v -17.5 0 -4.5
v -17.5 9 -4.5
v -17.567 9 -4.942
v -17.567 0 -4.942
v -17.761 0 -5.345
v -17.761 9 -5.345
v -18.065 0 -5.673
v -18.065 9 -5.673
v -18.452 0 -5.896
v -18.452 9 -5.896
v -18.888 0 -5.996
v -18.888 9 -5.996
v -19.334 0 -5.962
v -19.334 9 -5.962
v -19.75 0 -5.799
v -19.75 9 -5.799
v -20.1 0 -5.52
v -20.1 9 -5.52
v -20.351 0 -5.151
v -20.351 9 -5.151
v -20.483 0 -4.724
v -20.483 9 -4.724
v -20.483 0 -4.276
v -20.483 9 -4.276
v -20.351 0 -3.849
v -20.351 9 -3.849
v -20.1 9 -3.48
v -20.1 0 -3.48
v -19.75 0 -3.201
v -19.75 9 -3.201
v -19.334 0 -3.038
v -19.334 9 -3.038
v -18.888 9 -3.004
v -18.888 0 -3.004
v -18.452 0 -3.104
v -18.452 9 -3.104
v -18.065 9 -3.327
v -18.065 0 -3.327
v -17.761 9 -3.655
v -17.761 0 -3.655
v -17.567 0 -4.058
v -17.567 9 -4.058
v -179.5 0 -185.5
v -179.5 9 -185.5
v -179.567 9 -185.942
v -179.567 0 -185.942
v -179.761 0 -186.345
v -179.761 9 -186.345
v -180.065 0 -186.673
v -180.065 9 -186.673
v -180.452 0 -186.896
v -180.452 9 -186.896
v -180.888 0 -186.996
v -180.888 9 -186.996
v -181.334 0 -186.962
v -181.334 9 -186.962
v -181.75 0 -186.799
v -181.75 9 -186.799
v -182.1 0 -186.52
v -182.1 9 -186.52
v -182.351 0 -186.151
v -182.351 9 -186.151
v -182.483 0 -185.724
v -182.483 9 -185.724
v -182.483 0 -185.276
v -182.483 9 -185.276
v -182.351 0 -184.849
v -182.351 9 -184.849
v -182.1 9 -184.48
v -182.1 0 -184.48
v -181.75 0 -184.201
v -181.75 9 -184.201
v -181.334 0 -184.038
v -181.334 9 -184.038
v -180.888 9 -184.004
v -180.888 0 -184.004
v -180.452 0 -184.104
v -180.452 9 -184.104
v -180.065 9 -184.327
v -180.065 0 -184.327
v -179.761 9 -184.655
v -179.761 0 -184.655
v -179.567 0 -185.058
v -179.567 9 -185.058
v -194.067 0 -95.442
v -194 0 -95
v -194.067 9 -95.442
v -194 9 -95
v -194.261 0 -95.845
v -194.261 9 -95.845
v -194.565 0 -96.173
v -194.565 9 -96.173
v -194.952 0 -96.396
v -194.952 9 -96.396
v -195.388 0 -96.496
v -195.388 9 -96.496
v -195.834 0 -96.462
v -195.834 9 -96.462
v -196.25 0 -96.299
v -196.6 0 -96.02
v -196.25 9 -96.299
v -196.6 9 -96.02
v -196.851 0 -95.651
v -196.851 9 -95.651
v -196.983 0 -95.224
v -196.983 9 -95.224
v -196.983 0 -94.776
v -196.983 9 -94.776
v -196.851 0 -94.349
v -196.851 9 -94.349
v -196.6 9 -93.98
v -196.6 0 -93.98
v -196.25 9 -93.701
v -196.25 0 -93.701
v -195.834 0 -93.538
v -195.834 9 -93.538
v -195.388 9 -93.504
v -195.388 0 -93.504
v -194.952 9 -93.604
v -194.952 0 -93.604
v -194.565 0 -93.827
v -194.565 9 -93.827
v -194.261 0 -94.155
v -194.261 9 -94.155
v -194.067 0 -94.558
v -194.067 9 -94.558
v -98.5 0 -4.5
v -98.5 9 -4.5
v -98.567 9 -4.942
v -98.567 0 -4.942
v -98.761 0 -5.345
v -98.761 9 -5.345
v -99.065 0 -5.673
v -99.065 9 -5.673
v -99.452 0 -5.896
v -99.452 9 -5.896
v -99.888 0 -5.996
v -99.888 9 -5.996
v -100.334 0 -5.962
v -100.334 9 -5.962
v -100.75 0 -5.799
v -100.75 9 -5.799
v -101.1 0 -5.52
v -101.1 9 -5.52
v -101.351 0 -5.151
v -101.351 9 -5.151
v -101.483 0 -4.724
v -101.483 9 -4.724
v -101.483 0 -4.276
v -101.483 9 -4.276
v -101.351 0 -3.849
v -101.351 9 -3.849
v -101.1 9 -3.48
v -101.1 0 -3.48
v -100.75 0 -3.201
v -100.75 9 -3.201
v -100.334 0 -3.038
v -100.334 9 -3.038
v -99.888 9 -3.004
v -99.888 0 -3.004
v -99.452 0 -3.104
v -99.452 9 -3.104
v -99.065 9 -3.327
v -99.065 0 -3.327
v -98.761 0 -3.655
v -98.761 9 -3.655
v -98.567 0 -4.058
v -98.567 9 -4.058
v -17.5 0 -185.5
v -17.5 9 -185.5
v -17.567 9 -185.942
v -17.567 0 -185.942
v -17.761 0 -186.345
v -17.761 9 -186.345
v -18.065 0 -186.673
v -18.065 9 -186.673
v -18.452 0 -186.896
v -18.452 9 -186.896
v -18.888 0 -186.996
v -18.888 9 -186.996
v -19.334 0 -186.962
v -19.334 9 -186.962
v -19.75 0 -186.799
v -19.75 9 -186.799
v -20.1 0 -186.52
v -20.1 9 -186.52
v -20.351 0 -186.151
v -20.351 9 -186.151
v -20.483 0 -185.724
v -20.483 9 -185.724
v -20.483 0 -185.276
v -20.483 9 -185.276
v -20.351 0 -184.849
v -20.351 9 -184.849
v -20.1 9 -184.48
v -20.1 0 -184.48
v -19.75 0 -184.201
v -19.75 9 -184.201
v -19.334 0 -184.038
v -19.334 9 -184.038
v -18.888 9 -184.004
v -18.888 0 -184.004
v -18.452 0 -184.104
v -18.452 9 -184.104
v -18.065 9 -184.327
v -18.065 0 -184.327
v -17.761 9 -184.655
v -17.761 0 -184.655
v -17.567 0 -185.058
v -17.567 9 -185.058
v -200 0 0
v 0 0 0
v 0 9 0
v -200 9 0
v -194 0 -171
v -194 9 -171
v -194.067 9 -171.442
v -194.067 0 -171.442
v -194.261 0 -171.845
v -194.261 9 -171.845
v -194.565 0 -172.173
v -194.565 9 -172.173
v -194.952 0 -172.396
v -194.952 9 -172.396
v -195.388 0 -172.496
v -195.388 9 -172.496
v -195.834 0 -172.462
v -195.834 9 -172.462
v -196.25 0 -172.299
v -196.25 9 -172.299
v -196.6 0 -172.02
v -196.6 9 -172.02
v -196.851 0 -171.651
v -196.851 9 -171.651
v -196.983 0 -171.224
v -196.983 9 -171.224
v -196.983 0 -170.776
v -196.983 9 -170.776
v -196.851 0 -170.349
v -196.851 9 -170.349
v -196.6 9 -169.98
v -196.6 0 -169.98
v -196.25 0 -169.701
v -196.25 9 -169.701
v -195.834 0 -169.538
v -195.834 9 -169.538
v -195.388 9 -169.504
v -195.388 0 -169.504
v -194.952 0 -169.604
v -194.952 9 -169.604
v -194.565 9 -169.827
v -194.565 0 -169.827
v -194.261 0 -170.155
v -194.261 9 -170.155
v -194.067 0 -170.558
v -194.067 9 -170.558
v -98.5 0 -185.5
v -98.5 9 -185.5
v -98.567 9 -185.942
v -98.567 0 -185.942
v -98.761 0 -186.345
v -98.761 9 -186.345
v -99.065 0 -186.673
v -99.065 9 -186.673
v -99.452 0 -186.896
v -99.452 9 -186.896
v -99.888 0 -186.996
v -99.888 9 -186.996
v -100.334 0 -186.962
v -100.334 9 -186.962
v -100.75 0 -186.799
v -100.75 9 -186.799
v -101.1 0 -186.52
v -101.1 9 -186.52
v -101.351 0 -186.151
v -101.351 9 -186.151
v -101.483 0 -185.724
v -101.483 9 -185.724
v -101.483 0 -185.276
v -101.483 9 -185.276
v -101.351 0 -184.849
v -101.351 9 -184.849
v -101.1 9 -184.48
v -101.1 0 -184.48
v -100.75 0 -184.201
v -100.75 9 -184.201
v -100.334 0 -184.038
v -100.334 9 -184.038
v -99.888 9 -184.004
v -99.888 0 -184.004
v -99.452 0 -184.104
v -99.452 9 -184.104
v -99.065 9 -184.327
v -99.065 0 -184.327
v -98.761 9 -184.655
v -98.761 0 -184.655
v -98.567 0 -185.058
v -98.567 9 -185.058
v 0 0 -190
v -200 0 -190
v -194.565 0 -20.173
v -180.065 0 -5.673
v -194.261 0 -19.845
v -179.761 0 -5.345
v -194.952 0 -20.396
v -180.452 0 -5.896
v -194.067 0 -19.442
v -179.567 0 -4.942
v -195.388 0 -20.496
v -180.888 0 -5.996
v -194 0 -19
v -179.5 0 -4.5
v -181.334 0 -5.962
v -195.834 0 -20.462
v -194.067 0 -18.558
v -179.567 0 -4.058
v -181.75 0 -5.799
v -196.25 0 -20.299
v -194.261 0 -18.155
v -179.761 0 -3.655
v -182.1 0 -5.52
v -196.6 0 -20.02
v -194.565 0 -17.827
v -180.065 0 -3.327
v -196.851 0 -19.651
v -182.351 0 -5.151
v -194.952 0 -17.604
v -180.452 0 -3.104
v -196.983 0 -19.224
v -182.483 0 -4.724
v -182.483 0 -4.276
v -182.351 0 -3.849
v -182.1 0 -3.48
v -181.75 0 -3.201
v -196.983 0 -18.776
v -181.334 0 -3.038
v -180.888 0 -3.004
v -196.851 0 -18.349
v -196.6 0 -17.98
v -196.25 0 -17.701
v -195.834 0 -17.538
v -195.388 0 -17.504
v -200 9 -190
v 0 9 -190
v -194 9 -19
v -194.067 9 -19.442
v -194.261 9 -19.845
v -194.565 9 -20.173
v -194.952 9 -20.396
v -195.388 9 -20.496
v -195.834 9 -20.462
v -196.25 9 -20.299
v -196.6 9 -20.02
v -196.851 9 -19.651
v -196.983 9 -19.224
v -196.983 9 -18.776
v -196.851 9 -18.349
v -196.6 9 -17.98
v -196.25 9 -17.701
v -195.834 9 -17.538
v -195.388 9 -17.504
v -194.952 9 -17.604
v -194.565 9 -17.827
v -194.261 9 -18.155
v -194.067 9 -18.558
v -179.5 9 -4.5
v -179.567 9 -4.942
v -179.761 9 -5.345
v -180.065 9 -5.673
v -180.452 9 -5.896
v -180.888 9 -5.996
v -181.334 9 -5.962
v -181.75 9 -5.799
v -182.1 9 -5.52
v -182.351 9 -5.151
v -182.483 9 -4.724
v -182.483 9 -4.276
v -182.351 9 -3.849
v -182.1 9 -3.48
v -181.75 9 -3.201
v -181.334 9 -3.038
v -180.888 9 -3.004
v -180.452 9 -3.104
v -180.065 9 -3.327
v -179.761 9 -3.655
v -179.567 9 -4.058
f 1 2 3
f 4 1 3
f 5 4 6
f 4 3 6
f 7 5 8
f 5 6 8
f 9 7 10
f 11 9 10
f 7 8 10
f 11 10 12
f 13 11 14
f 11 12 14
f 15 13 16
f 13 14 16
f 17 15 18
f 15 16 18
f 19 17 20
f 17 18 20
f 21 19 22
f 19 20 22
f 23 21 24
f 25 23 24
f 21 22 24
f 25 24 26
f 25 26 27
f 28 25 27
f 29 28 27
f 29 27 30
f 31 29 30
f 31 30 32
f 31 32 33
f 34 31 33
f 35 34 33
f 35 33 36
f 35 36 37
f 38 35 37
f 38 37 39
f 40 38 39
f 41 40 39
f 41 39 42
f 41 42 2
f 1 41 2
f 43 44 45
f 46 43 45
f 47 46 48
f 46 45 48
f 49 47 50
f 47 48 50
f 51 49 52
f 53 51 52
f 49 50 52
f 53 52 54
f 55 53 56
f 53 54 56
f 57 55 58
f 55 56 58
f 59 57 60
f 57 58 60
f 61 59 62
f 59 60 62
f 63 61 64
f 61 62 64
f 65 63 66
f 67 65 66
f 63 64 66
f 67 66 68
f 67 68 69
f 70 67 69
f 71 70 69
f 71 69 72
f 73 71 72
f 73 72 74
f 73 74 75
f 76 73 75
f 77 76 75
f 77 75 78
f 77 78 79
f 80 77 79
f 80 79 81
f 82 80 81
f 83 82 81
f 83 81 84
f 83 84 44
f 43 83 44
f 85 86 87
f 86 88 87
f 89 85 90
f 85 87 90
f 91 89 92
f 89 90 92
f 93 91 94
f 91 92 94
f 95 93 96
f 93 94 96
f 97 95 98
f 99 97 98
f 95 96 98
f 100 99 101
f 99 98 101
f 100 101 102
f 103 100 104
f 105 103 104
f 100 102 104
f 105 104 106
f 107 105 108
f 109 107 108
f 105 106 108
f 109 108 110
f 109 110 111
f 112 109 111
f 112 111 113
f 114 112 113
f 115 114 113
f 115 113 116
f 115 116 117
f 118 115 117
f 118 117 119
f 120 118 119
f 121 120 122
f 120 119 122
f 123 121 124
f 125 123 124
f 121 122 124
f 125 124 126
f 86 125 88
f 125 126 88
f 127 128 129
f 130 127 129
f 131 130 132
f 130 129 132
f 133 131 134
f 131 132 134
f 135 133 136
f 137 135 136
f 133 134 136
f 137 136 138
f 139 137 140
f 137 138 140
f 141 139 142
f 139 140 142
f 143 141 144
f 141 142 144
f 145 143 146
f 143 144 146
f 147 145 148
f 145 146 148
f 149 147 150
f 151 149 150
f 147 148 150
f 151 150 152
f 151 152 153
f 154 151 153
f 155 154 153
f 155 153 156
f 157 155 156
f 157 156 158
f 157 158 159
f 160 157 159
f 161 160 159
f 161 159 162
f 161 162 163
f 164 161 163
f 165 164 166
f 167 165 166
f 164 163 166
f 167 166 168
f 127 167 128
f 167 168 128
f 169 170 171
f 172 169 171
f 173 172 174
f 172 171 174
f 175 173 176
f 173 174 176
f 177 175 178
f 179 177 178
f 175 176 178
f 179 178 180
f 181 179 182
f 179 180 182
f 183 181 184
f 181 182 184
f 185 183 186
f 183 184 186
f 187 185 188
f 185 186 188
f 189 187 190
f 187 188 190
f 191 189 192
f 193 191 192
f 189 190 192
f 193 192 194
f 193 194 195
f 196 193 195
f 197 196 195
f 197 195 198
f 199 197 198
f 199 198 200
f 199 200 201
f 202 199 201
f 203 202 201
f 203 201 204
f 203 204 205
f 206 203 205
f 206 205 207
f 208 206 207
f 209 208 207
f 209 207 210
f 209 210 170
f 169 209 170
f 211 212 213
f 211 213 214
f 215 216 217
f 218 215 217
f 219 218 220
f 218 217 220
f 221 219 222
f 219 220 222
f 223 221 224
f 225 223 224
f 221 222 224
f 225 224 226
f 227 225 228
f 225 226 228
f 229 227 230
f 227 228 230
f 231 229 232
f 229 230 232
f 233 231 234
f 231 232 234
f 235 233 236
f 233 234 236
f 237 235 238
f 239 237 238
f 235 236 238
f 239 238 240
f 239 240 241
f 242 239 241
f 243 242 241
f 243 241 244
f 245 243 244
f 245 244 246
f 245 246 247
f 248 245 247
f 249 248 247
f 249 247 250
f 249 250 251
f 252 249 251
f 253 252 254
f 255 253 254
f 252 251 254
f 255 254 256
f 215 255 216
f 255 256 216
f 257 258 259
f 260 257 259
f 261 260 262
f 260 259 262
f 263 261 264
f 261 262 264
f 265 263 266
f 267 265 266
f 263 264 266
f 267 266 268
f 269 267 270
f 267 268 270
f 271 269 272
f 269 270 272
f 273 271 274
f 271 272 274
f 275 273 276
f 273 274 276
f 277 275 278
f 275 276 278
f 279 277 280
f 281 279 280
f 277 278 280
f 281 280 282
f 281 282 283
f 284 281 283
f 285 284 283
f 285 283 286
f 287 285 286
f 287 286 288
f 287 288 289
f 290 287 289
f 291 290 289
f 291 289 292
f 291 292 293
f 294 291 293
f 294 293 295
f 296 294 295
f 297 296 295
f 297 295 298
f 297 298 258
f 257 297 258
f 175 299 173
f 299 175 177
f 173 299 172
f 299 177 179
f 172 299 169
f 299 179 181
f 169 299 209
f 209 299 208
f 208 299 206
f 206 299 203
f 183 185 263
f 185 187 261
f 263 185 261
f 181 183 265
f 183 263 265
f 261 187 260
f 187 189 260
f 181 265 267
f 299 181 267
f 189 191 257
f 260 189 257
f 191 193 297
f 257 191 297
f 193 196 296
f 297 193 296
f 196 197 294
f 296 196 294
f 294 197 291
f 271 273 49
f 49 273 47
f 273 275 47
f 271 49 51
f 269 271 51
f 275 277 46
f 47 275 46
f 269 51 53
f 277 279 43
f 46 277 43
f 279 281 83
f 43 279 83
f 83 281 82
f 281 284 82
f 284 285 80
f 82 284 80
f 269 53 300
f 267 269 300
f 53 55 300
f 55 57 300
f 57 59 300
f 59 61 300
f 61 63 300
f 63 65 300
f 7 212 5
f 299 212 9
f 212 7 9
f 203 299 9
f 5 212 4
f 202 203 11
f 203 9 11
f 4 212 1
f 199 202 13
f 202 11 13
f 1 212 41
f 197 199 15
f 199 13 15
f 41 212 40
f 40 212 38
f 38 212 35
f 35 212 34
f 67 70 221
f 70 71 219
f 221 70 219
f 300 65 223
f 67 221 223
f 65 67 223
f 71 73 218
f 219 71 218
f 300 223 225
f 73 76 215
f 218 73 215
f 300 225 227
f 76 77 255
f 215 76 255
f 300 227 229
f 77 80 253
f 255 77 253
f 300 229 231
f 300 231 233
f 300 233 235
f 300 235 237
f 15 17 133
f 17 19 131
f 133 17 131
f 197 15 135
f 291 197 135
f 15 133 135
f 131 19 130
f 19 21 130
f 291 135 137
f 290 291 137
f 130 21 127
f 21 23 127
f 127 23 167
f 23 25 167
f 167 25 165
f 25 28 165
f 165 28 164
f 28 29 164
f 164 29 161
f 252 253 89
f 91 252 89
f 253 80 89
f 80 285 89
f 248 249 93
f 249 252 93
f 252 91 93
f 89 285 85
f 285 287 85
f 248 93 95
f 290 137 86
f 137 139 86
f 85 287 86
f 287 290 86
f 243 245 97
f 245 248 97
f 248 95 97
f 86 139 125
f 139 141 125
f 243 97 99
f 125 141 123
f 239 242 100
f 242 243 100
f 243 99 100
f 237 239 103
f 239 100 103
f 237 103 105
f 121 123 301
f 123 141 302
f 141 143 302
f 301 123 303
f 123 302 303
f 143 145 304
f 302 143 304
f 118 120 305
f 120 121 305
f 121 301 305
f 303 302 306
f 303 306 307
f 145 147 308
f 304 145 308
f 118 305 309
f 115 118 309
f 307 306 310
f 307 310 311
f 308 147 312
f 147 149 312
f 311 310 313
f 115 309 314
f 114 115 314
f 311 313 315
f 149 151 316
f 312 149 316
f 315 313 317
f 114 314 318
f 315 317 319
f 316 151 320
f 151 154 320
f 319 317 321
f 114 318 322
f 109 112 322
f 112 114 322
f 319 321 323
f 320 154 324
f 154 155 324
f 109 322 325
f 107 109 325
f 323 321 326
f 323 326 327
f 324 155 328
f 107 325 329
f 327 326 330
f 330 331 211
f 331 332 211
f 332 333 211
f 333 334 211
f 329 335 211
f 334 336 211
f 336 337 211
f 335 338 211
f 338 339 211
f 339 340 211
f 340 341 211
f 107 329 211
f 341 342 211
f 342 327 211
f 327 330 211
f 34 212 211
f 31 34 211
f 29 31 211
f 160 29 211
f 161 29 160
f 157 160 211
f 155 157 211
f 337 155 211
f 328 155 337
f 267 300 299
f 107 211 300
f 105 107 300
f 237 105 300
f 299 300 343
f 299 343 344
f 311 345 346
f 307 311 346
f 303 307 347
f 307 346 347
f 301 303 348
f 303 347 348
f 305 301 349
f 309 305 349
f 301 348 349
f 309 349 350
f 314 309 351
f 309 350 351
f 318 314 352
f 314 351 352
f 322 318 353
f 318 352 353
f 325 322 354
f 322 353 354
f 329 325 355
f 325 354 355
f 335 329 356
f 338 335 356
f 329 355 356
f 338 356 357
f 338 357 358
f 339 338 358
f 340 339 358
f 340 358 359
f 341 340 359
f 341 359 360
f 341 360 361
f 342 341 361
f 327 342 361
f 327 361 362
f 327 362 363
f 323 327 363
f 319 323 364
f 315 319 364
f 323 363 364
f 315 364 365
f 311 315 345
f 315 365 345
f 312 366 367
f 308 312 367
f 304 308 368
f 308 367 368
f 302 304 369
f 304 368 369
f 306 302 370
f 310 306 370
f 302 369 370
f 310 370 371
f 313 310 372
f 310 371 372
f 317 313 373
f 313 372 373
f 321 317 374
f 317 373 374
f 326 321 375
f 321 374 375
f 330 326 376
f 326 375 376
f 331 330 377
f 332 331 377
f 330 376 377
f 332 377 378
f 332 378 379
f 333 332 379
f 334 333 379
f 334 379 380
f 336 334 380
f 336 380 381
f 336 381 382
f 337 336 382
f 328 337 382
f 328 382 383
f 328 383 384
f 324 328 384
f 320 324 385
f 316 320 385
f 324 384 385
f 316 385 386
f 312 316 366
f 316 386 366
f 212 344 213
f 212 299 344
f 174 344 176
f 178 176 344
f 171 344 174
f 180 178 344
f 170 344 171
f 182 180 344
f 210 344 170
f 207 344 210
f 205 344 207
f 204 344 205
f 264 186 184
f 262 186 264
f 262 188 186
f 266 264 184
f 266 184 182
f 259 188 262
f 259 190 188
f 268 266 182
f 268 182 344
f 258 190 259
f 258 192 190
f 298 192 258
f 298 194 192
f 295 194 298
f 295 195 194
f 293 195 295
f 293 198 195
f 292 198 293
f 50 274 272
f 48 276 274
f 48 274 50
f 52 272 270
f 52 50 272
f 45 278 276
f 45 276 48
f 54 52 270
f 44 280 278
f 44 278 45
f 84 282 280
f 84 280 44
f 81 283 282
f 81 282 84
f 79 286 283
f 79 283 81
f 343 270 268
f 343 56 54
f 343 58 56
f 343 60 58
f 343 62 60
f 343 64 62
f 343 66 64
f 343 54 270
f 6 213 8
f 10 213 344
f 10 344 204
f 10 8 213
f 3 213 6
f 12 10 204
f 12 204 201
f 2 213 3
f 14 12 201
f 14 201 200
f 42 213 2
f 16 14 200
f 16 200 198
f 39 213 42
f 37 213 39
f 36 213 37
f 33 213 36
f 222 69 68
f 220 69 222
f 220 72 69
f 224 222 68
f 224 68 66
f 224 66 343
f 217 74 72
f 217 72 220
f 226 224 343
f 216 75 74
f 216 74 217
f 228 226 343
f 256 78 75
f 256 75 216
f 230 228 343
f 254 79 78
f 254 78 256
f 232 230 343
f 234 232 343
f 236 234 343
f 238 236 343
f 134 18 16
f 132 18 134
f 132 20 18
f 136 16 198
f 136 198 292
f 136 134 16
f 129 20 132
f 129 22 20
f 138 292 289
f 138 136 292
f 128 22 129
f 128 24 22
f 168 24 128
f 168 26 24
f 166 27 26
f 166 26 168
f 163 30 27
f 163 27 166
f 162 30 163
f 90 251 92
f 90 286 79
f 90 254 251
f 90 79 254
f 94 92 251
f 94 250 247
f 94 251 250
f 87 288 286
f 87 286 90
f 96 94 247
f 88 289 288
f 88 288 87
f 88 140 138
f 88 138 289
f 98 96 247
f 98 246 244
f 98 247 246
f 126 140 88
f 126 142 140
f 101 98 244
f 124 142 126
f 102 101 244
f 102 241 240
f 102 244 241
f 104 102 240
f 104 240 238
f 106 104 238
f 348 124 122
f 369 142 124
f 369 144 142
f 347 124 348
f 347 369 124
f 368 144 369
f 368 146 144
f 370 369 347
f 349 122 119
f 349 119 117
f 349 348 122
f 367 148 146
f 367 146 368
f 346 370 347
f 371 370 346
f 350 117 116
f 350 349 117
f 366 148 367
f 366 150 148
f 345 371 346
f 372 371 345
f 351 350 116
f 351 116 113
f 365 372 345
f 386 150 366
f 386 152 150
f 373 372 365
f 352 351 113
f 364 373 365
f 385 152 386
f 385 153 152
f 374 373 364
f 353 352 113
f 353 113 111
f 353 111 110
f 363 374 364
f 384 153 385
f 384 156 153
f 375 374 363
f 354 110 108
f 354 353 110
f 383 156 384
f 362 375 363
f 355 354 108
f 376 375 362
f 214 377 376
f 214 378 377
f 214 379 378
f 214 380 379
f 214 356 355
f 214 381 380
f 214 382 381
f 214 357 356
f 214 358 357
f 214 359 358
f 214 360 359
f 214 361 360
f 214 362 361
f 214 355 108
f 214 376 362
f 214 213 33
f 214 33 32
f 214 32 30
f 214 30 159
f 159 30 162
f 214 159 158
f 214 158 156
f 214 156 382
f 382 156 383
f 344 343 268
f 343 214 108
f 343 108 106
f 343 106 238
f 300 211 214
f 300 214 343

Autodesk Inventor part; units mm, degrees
ref_plane "YZ Plane" through (0, 0, 0) normal (1, 0, 0) x (0, 1, 0)
ref_plane "XZ Plane" through (0, 0, 0) normal (0, 1, 0) x (-1, 0, 0)
ref_plane "XY Plane" through (0, 0, 0) normal (0, 0, 1) x (1, 0, 0)
sketch "Sketch1" plane through (0, 0, 0) normal (0, 1, 0) x (-1, 0, 0)
  line L0 (0, 0) -> (200, 0)
  line L1 (200, 0) -> (200, -190)
  line L2 (200, -190) -> (0, -190)
  line L3 (0, -190) -> (0, 0)
  dimension "d0" = 200
  dimension "d1" = 190
extrude "Extrusion1" add sketch "Sketch1" along normal blind 9
sketch "Sketch14" plane through (0, 9, 0) normal (0, 1, 0) x (1, 0, 0)
  line L0 (0, 190) -> (-200, 190) projected
  line L1 (-200, 190) -> (-200, 0) projected
  line L2 (-200, 0) -> (0, 0) projected
  line L3 (0, 0) -> (0, 190) projected
  line L4 (-200, 190) -> (-200, 0) projected
  line L5 (-200, 190) -> (0, 190)
  line L6 (0, 190) -> (0, 181)
  line L7 (0, 181) -> (-200, 181)
  line L8 (-200, 181) -> (-200, 190)
  line L9 (-200, 0) -> (0, 0) projected
  line L10 (-200, 181) -> (-191, 181)
  line L11 (-191, 181) -> (-191, 0)
  line L12 (-191, 0) -> (-200, 0)
  line L13 (-200, 0) -> (-200, 181)
  line L14 (0, 0) -> (0, 190) projected
  line L15 (-191, 0) -> (0, 0)
  line L16 (0, 0) -> (0, 9)
  line L17 (0, 9) -> (-191, 9)
  line L18 (-191, 9) -> (-191, 0)
  circle A0 centre (-19, 4.5) radius 1.5
  circle A1 centre (-100, 4.5) radius 1.5
  circle A2 centre (-181, 4.5) radius 1.5
  line L19 (-245.0017, 95) -> (56.9583, 95)
  circle A3 centre (-19, 185.5) radius 1.5
  circle A4 centre (-100, 185.5) radius 1.5
  circle A5 centre (-181, 185.5) radius 1.5
  circle A6 centre (-195.5, 95) radius 1.5
  circle A7 centre (-195.5, 171) radius 1.5
  circle A8 centre (-195.5, 19) radius 1.5
  dimension "d47" = 9
  dimension "d48" = 9
  dimension "d49" = 9
  dimension "d50" = 3
  dimension "d51" = 3
  dimension "d52" = 3
  dimension "d55" = 3
  dimension "d56" = 3
  dimension "d57" = 3
  dimension "d60" = 19
extrude "Extrusion14" cut sketch "Sketch14" against normal blind 10 contours A0 | A1 | A2 | A3 | A4 | A5
extrude "Extrusion15" cut sketch "Sketch14" against normal blind 10 contours A6 L19 | L19 A6 | A7 | A8
properties part number "BaseEncima_3DPrint"
